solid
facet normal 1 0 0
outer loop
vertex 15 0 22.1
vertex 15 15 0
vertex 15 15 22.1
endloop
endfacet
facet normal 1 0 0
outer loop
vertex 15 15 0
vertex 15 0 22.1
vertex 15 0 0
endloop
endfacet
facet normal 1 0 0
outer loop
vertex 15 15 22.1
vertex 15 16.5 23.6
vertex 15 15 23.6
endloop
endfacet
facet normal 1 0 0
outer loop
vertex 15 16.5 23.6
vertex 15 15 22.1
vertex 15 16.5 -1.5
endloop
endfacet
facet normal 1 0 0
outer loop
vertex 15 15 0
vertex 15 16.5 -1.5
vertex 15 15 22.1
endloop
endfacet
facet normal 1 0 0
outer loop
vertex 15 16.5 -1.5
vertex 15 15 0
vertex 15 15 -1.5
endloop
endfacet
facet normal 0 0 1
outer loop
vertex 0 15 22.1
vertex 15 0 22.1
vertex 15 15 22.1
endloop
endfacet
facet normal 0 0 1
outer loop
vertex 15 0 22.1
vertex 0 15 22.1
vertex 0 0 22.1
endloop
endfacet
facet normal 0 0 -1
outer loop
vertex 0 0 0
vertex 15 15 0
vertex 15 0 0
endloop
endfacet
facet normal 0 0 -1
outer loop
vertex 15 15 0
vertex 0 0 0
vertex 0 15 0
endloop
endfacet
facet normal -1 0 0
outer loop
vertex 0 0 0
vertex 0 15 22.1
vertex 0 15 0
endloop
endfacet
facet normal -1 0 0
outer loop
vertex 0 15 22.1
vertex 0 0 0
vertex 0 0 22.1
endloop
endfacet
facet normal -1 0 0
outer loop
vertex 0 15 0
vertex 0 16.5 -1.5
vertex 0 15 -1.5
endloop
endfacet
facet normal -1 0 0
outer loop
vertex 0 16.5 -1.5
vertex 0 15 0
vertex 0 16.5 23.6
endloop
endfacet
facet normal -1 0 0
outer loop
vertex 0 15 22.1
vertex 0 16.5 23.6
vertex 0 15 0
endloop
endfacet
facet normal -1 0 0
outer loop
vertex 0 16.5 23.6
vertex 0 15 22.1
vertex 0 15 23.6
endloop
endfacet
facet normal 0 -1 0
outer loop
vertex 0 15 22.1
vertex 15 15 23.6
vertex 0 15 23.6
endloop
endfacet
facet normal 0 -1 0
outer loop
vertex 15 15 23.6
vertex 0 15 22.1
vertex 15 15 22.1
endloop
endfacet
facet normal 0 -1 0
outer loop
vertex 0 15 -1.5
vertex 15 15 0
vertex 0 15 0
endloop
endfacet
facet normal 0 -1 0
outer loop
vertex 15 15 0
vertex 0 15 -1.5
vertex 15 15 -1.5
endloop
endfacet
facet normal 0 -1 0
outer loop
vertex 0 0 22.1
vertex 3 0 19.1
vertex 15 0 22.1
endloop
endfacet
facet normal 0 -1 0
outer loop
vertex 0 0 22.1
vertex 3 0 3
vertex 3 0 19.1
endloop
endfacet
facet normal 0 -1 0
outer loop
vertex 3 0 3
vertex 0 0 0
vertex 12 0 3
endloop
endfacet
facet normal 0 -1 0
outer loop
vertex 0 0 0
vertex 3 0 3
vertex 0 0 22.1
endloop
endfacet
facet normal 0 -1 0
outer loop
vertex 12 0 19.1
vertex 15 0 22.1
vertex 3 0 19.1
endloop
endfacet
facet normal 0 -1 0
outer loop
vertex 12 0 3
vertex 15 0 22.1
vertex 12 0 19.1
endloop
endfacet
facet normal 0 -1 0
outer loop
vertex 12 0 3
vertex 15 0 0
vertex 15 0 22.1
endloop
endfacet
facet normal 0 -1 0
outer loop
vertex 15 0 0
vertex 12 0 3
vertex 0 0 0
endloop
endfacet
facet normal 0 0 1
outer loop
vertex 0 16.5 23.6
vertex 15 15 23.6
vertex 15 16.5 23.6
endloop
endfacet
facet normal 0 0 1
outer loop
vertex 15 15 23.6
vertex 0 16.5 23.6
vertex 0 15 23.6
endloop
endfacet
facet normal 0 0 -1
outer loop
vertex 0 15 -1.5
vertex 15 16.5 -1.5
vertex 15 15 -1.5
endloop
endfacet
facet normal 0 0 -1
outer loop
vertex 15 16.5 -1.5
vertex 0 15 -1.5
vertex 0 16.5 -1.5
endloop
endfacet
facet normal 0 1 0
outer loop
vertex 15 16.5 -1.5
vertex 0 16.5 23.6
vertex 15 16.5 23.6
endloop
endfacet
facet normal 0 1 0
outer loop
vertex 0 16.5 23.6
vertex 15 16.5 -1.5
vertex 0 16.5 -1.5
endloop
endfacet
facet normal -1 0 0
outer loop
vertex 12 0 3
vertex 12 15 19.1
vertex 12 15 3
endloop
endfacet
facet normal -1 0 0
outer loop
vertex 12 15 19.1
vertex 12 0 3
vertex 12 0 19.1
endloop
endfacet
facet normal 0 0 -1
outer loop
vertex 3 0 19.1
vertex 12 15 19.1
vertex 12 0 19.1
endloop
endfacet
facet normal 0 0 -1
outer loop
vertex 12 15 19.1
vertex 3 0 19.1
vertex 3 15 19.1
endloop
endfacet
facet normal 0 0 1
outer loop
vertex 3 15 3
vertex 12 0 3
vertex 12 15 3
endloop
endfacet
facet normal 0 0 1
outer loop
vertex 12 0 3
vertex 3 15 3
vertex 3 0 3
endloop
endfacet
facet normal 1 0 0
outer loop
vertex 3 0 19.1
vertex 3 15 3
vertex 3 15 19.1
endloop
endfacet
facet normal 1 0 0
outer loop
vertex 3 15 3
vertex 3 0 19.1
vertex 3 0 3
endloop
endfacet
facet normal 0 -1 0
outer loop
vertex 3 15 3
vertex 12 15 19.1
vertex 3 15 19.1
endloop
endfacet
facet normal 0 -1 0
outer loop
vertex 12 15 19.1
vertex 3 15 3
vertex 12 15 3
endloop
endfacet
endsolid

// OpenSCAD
/*

    Lock
    
    By Anton Augustsson


*/

$fn=90;  // accuracy

module hddLock (
    thumbDepth,
    thumbHeight,
    sliderHeight,
    lockLength,
    thickness,
    thicknessFront,
    trayHeight,
    trayWidth,
    trayLenght,
    hddWidth,
    hddLenght,
    x,y,z
    ){
/*
    ---------- Local varibles ---------- 
*/




/*
    ---------- Code ---------- 
*/

translate([
    x,
    y,
    z]) 
difference () {
union () {

// thumb lock
translate([
    0,
    0,
    0]) 
cube(size = [
    lockLength,
    thumbDepth,
    thumbHeight]);

// slider
translate([
    0,
    thumbDepth,
    -(sliderHeight-thumbHeight)/2]) 
cube(size = [
    lockLength,
    thickness,
    sliderHeight]);
}
union () {
// removal thum
translate([
    thickness*2,
    -1,
    thickness*2]) 
cube(size = [
    lockLength-thickness*4,
    thumbDepth+1,
    thumbHeight-thickness*4]);
    
}
}}


    
/*
    ---------- Example ---------- 
*/


thicknessBottom = 2; 
thicknessFront = 2;
thickness = 1.5;

hddHeight = 26.1; 
hddWidth = 101.6;  // 4 inches
hddLenght = 147.32; // 5.8

trayHeight = hddHeight+thicknessBottom;
trayFrontLength = 15+thicknessFront; 
trayWidth = 105;
trayLenght = hddLenght+trayFrontLength;

thicknessSide = (trayWidth-hddWidth)/2;


sliderHeight = trayHeight-thickness*2;
thumbDepth = trayFrontLength
    -thicknessFront;
thumbHeight = sliderHeight-(thickness*2);

lockLength = 15;


x=0;
y=0;
z=0;


hddLock (
    thumbDepth,
    thumbHeight,
    sliderHeight,
    lockLength,
    thickness,
    thicknessFront,
    trayHeight,
    trayWidth,
    trayLenght,
    hddWidth,
    hddLenght,
    x,y,z
    );
